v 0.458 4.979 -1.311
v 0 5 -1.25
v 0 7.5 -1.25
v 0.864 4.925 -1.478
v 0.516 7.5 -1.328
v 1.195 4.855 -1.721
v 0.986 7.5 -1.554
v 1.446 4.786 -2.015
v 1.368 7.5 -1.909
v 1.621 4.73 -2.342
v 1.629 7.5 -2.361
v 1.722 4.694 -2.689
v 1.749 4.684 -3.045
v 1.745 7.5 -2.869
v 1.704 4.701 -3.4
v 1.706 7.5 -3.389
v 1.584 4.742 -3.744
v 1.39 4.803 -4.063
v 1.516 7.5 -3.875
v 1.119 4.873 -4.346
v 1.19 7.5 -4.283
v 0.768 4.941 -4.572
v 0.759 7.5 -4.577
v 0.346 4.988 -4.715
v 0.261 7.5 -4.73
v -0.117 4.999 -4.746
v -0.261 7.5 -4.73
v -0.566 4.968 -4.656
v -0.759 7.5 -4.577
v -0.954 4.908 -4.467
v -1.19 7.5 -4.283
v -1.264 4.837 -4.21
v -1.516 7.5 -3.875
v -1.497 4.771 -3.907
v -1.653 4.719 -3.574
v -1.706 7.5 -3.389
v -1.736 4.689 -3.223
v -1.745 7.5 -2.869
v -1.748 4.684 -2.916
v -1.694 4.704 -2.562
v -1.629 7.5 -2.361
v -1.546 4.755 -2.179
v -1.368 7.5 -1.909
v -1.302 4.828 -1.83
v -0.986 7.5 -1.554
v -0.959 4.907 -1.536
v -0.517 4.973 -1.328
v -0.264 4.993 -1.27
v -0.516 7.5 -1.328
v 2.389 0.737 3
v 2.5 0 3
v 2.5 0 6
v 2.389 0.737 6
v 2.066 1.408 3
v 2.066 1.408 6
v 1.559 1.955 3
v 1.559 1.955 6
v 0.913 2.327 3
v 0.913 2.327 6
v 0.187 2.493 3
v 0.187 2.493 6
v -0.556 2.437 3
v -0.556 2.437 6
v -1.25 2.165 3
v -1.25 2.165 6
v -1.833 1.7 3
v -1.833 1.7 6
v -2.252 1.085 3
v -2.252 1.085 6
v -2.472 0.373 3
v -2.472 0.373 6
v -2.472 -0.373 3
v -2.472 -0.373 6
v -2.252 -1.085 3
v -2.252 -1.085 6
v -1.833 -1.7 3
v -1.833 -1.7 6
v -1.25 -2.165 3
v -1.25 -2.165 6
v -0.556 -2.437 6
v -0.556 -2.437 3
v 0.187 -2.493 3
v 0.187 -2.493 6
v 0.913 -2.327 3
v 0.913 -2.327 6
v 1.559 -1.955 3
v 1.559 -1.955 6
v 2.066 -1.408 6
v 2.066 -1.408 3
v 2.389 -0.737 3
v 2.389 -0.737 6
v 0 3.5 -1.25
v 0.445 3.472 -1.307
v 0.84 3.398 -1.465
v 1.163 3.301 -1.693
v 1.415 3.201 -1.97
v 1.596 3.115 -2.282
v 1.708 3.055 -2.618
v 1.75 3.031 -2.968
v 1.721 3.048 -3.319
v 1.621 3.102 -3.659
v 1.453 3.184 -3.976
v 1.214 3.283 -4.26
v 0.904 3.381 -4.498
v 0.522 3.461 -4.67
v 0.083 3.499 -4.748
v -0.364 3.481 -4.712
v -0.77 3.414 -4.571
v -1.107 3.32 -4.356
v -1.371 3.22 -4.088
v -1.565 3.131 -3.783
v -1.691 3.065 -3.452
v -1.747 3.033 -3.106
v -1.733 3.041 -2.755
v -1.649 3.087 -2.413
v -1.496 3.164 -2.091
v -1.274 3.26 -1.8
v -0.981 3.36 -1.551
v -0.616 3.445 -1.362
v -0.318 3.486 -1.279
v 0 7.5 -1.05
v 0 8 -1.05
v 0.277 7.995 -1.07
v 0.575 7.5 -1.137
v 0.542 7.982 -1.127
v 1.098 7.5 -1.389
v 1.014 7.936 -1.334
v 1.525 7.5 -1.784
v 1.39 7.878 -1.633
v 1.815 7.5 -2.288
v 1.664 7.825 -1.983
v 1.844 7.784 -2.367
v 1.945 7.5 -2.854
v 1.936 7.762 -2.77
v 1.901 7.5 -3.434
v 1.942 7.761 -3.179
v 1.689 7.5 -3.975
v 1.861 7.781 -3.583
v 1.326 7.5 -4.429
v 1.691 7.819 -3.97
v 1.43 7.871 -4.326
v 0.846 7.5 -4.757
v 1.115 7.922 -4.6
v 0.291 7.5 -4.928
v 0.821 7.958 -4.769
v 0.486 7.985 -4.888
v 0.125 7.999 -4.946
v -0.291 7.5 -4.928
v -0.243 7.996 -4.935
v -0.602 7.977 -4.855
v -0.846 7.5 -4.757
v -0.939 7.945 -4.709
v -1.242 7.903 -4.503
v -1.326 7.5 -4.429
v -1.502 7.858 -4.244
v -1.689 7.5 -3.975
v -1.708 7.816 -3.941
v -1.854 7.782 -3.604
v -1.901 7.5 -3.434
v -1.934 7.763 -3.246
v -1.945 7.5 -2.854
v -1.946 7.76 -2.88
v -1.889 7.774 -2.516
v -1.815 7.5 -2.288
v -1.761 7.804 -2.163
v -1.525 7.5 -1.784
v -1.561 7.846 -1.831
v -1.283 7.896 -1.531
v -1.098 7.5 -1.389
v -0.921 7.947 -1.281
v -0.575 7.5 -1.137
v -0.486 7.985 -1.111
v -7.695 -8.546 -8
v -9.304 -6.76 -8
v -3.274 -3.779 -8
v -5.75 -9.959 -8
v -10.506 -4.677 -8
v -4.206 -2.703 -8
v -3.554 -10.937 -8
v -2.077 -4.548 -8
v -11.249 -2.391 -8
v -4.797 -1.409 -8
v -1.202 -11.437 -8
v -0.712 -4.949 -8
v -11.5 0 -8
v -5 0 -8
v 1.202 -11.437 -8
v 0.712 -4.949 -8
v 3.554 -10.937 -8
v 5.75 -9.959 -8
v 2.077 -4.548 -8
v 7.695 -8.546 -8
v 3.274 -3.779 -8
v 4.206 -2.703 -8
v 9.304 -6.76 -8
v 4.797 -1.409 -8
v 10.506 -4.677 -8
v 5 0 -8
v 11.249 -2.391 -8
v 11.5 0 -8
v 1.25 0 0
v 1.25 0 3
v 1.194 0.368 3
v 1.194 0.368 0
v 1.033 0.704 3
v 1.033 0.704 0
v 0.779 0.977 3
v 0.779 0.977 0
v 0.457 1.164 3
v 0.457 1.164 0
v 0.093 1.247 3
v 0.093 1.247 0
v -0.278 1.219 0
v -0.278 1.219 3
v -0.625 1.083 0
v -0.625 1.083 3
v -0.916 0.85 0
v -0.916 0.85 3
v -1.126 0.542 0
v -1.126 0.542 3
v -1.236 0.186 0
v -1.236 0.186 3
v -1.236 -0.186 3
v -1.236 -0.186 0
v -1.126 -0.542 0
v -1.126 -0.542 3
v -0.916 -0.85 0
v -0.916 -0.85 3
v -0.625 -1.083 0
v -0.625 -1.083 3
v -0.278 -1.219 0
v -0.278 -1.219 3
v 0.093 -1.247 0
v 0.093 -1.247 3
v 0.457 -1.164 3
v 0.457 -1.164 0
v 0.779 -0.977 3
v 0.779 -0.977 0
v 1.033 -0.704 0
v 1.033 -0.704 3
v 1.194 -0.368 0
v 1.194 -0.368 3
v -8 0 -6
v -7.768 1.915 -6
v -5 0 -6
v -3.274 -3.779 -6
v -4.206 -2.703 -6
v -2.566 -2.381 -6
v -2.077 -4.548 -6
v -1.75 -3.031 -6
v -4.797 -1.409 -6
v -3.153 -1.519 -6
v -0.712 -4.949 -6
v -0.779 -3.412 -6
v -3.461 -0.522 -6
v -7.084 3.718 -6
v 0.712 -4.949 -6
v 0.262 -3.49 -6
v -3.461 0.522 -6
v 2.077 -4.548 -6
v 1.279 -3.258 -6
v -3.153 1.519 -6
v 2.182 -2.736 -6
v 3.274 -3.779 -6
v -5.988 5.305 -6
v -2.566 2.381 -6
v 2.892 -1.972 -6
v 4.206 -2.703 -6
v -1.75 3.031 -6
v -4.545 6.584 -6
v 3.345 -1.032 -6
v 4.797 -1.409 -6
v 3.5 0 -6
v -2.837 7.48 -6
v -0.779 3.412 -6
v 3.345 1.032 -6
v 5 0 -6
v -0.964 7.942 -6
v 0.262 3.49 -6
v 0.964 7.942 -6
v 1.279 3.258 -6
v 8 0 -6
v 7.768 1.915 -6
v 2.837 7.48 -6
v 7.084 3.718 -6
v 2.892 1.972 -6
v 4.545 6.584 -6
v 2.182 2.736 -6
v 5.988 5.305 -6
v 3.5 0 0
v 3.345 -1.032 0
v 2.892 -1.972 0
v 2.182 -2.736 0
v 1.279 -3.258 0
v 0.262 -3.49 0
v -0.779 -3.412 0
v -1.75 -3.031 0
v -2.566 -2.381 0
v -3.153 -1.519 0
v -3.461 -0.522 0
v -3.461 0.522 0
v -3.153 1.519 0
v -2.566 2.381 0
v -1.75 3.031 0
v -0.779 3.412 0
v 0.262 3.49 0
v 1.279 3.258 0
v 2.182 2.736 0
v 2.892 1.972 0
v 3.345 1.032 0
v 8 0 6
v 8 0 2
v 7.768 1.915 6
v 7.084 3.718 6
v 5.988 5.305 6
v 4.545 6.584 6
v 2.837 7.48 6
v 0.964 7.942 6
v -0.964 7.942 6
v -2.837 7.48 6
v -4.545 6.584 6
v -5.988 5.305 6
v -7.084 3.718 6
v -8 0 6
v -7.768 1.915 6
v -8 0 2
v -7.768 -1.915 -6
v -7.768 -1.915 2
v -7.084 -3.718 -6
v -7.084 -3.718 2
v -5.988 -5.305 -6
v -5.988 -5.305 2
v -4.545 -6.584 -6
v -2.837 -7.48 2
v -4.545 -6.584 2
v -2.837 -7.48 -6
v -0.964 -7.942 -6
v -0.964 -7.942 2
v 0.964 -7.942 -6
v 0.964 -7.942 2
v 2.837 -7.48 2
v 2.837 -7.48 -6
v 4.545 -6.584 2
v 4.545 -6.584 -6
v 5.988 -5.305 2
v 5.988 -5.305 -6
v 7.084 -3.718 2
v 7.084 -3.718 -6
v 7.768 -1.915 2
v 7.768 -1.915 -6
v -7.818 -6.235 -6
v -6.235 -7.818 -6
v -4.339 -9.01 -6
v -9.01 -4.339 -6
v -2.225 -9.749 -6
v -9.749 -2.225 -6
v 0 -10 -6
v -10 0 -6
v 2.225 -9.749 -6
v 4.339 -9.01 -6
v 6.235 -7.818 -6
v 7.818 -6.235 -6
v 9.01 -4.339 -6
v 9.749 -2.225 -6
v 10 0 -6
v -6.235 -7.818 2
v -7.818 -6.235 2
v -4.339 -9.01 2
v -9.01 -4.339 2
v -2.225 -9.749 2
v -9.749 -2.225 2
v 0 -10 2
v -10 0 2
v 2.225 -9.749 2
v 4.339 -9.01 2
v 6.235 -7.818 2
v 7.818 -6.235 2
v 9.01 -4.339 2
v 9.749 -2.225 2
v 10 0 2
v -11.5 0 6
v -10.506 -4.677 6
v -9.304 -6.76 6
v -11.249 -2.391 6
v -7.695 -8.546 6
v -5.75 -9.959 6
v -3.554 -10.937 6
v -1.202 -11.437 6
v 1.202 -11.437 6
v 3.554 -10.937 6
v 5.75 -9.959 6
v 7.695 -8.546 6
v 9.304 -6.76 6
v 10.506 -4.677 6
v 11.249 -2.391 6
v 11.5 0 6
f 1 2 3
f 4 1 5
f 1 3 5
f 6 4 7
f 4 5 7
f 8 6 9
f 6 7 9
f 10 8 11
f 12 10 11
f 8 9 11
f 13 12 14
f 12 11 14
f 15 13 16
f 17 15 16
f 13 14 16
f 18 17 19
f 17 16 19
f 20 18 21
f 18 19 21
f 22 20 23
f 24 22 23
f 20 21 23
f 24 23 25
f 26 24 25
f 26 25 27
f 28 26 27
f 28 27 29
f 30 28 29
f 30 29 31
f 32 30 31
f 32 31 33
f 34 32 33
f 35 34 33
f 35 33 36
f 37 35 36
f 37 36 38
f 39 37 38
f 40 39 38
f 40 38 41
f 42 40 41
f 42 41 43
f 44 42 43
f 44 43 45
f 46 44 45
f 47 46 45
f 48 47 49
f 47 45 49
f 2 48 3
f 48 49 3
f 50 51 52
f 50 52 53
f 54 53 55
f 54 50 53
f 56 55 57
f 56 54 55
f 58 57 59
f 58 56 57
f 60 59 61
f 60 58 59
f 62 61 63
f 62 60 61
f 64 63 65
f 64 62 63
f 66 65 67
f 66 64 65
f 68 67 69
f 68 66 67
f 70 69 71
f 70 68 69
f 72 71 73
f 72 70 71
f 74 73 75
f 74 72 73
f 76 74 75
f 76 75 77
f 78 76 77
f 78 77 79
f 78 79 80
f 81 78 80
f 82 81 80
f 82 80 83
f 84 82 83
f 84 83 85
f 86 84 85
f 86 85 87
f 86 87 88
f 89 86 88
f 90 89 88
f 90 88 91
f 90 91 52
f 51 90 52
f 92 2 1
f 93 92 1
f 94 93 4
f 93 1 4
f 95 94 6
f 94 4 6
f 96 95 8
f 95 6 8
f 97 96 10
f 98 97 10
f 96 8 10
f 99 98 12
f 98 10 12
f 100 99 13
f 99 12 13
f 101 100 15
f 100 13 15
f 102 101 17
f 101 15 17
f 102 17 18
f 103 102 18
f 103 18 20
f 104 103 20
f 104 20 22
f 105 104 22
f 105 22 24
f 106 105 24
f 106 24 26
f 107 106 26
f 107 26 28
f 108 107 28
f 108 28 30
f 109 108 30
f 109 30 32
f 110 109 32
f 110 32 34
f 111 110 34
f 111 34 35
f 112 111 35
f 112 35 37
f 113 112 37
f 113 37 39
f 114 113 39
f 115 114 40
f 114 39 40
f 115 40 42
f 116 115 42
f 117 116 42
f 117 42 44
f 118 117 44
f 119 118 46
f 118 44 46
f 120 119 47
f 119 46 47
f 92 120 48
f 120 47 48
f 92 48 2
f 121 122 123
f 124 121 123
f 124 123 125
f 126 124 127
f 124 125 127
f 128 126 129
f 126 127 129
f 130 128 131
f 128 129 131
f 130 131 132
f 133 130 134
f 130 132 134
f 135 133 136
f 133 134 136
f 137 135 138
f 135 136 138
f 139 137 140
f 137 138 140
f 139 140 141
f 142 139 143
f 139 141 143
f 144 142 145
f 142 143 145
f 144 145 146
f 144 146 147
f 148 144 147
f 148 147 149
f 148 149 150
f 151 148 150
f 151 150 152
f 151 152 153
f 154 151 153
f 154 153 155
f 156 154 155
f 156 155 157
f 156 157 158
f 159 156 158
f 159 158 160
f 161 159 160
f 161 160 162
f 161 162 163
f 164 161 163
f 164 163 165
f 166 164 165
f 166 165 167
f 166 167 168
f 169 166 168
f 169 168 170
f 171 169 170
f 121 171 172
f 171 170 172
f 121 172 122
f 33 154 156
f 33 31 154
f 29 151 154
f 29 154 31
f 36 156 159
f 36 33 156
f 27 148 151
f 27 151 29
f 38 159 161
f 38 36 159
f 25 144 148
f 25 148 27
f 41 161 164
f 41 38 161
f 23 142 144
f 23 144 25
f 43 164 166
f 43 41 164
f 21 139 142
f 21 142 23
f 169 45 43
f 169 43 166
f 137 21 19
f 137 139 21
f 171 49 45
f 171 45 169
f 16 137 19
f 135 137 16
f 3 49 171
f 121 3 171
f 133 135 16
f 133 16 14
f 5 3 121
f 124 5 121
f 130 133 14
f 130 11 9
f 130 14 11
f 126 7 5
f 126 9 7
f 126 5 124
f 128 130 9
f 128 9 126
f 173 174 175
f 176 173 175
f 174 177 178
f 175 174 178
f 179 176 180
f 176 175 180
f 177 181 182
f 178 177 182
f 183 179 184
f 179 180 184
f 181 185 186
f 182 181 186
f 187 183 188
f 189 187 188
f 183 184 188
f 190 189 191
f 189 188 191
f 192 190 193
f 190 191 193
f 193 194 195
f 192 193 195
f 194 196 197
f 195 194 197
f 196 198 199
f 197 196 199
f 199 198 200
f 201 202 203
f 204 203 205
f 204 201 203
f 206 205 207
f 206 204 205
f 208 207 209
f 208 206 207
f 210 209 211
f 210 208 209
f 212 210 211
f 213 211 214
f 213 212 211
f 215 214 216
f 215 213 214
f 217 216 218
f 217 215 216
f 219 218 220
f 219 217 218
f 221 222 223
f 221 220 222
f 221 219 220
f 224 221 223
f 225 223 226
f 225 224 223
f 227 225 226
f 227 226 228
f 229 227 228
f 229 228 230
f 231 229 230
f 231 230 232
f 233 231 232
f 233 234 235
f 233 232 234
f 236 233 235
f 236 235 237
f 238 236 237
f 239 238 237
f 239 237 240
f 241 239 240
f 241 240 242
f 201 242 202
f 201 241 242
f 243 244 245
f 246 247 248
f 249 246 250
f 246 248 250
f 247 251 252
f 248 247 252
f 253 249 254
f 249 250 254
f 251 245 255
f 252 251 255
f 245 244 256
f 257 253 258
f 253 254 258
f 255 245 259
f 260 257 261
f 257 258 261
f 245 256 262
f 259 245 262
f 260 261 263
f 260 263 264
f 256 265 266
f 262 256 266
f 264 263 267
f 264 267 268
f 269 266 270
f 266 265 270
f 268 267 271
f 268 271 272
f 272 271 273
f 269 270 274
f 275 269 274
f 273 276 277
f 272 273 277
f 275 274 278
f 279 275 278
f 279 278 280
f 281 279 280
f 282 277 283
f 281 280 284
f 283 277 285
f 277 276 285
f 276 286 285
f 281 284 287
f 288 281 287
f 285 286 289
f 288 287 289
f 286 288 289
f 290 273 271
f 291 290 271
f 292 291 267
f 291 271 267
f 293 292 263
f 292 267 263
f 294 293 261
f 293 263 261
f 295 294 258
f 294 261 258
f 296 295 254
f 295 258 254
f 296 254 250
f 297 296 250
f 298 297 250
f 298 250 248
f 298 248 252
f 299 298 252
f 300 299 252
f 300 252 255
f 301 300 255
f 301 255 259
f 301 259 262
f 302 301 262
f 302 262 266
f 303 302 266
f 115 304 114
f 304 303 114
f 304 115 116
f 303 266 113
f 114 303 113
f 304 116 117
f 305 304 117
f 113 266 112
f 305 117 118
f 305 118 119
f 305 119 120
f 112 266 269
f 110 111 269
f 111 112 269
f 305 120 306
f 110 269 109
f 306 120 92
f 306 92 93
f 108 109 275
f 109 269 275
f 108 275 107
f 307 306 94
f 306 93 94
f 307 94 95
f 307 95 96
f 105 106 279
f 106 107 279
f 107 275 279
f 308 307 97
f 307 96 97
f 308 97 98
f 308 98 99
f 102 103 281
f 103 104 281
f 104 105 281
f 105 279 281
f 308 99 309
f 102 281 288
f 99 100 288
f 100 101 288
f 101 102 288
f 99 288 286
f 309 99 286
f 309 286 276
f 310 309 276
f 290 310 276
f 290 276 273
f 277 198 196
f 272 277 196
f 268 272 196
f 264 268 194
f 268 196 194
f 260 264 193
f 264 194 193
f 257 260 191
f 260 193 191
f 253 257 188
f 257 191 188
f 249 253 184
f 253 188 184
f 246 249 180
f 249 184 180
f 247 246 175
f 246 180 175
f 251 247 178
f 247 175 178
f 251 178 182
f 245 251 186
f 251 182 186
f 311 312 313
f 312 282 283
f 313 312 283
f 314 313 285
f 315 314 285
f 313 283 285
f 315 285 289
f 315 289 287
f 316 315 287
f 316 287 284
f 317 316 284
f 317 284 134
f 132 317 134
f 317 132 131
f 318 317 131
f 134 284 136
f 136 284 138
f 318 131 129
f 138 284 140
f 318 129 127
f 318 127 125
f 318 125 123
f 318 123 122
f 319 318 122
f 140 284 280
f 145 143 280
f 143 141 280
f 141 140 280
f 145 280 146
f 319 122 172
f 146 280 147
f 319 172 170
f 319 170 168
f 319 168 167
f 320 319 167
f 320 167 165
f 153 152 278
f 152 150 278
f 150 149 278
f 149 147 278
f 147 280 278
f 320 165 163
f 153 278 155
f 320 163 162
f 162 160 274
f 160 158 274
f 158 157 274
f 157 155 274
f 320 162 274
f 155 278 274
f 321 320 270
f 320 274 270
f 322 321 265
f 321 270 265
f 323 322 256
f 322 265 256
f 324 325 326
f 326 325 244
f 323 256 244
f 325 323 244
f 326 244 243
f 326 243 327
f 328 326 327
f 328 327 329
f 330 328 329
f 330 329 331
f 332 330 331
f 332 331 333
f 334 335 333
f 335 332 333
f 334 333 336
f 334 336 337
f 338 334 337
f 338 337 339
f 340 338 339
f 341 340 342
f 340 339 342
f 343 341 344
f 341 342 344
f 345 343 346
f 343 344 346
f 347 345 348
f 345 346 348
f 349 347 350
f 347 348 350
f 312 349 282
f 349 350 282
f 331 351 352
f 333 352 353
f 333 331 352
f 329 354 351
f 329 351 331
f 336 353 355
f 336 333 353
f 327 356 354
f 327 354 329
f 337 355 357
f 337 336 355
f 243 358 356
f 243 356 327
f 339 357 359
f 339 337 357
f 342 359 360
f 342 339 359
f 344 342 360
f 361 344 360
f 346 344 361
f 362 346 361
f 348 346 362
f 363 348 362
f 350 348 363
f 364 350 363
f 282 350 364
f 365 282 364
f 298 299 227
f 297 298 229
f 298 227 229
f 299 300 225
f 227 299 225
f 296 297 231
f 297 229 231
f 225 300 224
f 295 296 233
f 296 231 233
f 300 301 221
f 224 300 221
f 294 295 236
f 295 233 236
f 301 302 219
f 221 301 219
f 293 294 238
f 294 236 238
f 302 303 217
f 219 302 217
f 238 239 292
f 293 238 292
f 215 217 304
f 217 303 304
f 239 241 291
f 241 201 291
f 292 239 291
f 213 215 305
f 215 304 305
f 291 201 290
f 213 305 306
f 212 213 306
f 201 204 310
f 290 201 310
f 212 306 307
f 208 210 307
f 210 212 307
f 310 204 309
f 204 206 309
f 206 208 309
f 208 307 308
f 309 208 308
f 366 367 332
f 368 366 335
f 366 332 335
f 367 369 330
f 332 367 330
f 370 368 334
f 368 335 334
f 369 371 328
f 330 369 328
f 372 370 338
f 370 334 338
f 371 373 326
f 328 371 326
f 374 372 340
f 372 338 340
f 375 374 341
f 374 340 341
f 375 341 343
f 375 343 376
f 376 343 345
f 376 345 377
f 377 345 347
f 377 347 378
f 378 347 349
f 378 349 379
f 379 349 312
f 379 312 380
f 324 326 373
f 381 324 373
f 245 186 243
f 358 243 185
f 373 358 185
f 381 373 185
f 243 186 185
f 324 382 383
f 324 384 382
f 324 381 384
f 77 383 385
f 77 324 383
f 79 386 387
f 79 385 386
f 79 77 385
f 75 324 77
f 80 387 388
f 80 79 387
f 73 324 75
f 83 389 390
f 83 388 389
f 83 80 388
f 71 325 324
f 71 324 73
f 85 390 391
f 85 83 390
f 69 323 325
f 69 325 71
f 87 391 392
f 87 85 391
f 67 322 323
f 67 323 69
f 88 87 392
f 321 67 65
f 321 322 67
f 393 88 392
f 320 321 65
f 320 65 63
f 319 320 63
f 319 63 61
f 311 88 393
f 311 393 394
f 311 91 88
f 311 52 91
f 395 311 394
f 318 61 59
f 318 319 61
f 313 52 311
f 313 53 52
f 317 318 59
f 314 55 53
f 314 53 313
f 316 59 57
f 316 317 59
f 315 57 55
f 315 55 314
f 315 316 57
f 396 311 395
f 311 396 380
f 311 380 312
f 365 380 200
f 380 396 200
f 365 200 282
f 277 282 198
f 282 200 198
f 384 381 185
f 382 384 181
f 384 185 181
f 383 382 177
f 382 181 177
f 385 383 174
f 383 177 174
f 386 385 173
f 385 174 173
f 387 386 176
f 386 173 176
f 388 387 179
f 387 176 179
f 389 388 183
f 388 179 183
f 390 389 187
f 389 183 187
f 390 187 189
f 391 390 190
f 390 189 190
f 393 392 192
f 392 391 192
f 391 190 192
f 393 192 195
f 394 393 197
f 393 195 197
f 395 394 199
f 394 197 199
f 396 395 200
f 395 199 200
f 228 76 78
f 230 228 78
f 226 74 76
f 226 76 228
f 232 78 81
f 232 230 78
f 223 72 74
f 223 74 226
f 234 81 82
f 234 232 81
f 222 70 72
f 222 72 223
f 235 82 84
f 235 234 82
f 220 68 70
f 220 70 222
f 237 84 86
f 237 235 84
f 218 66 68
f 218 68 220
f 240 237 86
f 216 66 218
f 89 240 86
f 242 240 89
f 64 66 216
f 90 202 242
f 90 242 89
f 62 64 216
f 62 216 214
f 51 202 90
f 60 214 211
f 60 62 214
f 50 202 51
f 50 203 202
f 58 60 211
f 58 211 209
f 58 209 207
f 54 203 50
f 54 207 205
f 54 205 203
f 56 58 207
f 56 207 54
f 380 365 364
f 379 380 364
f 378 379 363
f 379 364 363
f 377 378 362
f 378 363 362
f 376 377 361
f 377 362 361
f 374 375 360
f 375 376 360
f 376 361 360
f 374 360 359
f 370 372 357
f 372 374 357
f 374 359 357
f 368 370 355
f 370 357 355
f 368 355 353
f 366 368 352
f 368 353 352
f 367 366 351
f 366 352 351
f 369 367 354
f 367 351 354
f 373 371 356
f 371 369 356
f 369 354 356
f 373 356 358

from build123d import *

# Parameters (mm, degrees)
SKETCH_1_R           = 5
SKETCH_1_R_2         = 2.5
EXTRUDE_1_DEPTH      = 6
SKETCH_2_R           = 2.5
EXTRUDE_2_DEPTH      = 3
SKETCH_3_R           = 1.25
CUT_EXTRUDE_3_DEPTH  = 10.273618495
EXTRUDE_START        = -12
SKETCH_8_R           = 8
SKETCH_8_R_2         = 5
EXTRUDE_4_DEPTH      = 12
SKETCH_11_R          = 1.75
CUT_EXTRUDE_4_DEPTH  = 12
SKETCH_12_R          = 1.95
CUT_EXTRUDE_5_DEPTH  = 0.5
EXTRUDE_START_2      = -10
EXTRUDE_5_DEPTH      = 10
FILLET_1_R           = 1
CUT_EXTRUDE_7_DEPTH  = 6
CUT_EXTRUDE_8_DEPTH  = 10
FILLET_2_R           = 10
EXTRUDE_START_3      = 2
EXTRUDE_6_DEPTH      = 2
EXTRUDE_7_DEPTH      = 2
CUT_EXTRUDE_9_DEPTH  = 27.588216719
EXTRUDE_START_4      = 6
SKETCH_20_R          = 5
SKETCH_20_R_2        = 3.5
EXTRUDE_8_DEPTH      = 6
SKETCH_21_R          = 1.75
CUT_EXTRUDE_10_DEPTH = 10


with BuildPart() as part:
    # 草图1 → 凸台-拉伸1 (new body)
    with BuildSketch(Plane.XY):
        Circle(SKETCH_1_R)
        Circle(SKETCH_1_R_2, mode=Mode.SUBTRACT)
    extrude(amount=EXTRUDE_1_DEPTH)

    # 草图2 → 凸台-拉伸2 (add)
    with BuildSketch(Plane.XY):
        Circle(SKETCH_2_R)
    extrude(amount=EXTRUDE_2_DEPTH)

    # 草图3 → 切除-拉伸3 (cut, through all)
    with BuildSketch(Plane.XY):
        Circle(SKETCH_3_R)
    extrude(amount=CUT_EXTRUDE_3_DEPTH, mode=Mode.SUBTRACT)

    # 草图8 → 凸台-拉伸4 (add)
    with BuildSketch(Plane.XY.offset(6).offset(EXTRUDE_START)):
        Circle(SKETCH_8_R)
        Circle(SKETCH_8_R_2, mode=Mode.SUBTRACT)
    extrude(amount=EXTRUDE_4_DEPTH)

    # 草图11 → 切除-拉伸4 (cut)
    with BuildSketch(Plane(origin=(0, 8, 0), x_dir=(1, 0, 0), z_dir=(0, 1, 0))):
        with Locations(Location((0, 3, 0), (0, 0, 270))):
            Circle(SKETCH_11_R)
    extrude(amount=-CUT_EXTRUDE_4_DEPTH, mode=Mode.SUBTRACT)

    # 草图12 → 切除-拉伸5 (cut)
    with BuildSketch(Plane(origin=(0, 8, 0), x_dir=(1, 0, 0), z_dir=(0, 1, 0))):
        with Locations(Location((0, 3, 0), (0, 0, 270))):
            Circle(SKETCH_12_R)
    extrude(amount=-CUT_EXTRUDE_5_DEPTH, mode=Mode.SUBTRACT)

    # 草图13 → 凸台-拉伸5 (add)
    with BuildSketch(Plane.XY.offset(6).offset(EXTRUDE_START_2)):
        with BuildLine():
            Line((-8, 0), (-16, 0))
            ThreePointArc((-16, 0), (0, -16), (16, 0))
            Line((16, 0), (8, 0))
            ThreePointArc((8, 0), (0, -8), (-8, 0))
        make_face()
    extrude(amount=EXTRUDE_5_DEPTH)

    # 圆角1
    fillet_1_edges = [part.edges().sort_by_distance(p)[0] for p in [
        (16, 0, 1),
        (-16, 0, 1),
    ]]
    fillet(fillet_1_edges, radius=FILLET_1_R)

    # 草图15 → 切除-拉伸7 (cut)
    with BuildSketch(Plane(origin=(0, 0, -4), x_dir=(-1, 0, 0), z_dir=(0, 0, -1))):
        with BuildLine():
            Line((-10, 0), (-8, 0))
            ThreePointArc((-8, 0), (0, -8), (8, 0))
            Line((8, 0), (10, 0))
            ThreePointArc((10, 0), (0, -10), (-10, 0))
        make_face()
    extrude(amount=-CUT_EXTRUDE_7_DEPTH, mode=Mode.SUBTRACT)

    # 草图16 → 切除-拉伸8 (cut)
    with BuildSketch(Plane(origin=(0, 0, -4), x_dir=(-1, 0, 0), z_dir=(0, 0, -1))):
        with BuildLine():
            Line((11.661330827, 0), (14.966629547, 0))
            ThreePointArc((14.966629547, 0), (15.69692629, -0.316869949), (15.96440485, -1.066666667))
            ThreePointArc((15.96440485, -1.066666667), (13.334766709, -8.842171499), (7.195716327, -14.290614631))
            ThreePointArc((7.195716327, -14.290614631), (10.518928308, -7.486043338), (11.661330827, 0))
        make_face()
    extrude(amount=-CUT_EXTRUDE_8_DEPTH, mode=Mode.SUBTRACT)

    # 圆角2
    fillet_2_edges = [part.edges().sort_by_distance(p)[0] for p in [
        (-7.195716327, -14.290614631, 1),
    ]]
    fillet(fillet_2_edges, radius=FILLET_2_R)

    # 草图17 → 凸台-拉伸6 (add)
    with BuildSketch(Plane(origin=(0, 0, -4), x_dir=(-1, 0, 0), z_dir=(0, 0, -1)).offset(EXTRUDE_START_3)):
        with BuildLine():
            Line((10, 0), (11.661330827, 0))
            ThreePointArc((11.661330827, 0), (11.141957729, -5.079523953), (9.605333334, -9.948825493))
            ThreePointArc((9.605333334, -9.948825493), (6.210515001, -14.141064577), (1.131984253, -15.95990638))
            ThreePointArc((1.131984253, -15.95990638), (-10.509629988, -12.064314217), (-15.96440485, -1.066666667))
            ThreePointArc((-15.96440485, -1.066666667), (-15.69692629, -0.316869949), (-14.966629547, 0))
            Line((-14.966629547, 0), (-10, 0))
            ThreePointArc((-10, 0), (0, -10), (10, 0))
        make_face()
    extrude(amount=-EXTRUDE_6_DEPTH)

    # 草图18 → 凸台-拉伸7 (add)
    with BuildSketch(Plane(origin=(0, 0, -6), x_dir=(-1, 0, 0), z_dir=(0, 0, -1)).offset(EXTRUDE_START_3)):
        with BuildLine():
            Line((10, 0), (11.661330827, 0))
            ThreePointArc((11.661330827, 0), (11.141957729, -5.079523953), (9.605333334, -9.948825493))
            ThreePointArc((9.605333334, -9.948825493), (6.210515001, -14.141064577), (1.131984253, -15.95990638))
            ThreePointArc((1.131984253, -15.95990638), (-10.509629988, -12.064314217), (-15.96440485, -1.066666667))
            ThreePointArc((-15.96440485, -1.066666667), (-15.69692629, -0.316869949), (-14.966629547, 0))
            Line((-14.966629547, 0), (-10, 0))
            Line((-10, 0), (-8, 0))
            Line((-8, 0), (-5, 0))
            ThreePointArc((-5, 0), (0, -5), (5, 0))
            Line((5, 0), (8, 0))
            Line((8, 0), (10, 0))
        make_face()
    extrude(amount=-EXTRUDE_7_DEPTH)

    # 草图19 → 切除-拉伸9 (cut, through all)
    with BuildSketch(Plane(origin=(0, 0, -8), x_dir=(-1, 0, 0), z_dir=(0, 0, -1))):
        with BuildLine():
            Line((11.661330827, 0), (11.5, 0))
            ThreePointArc((11.5, 0), (0, -11.5), (-11.5, 0))
            Line((-11.5, 0), (-14.966629547, 0))
            ThreePointArc((-14.966629547, 0), (-15.69692629, -0.316869949), (-15.96440485, -1.066666667))
            ThreePointArc((-15.96440485, -1.066666667), (-10.509629988, -12.064314217), (1.131984253, -15.95990638))
            ThreePointArc((1.131984253, -15.95990638), (6.210515001, -14.141064577), (9.605333334, -9.948825493))
            ThreePointArc((9.605333334, -9.948825493), (11.141957729, -5.079523953), (11.661330827, 0))
        make_face()
    extrude(amount=-CUT_EXTRUDE_9_DEPTH, mode=Mode.SUBTRACT)

    # 草图20 → 凸台-拉伸8 (add)
    with BuildSketch(Plane(origin=(0, 0, 0), x_dir=(-1, 0, 0), z_dir=(0, 0, -1)).offset(EXTRUDE_START_4)):
        Circle(SKETCH_20_R)
        with Locations(Location((0, 0, 0), (0, 0, 180))):
            Circle(SKETCH_20_R_2, mode=Mode.SUBTRACT)
    extrude(amount=-EXTRUDE_8_DEPTH)

    # 草图21 → 切除-拉伸10 (cut)
    with BuildSketch(Plane(origin=(0, 8, 0), x_dir=(1, 0, 0), z_dir=(0, 1, 0))):
        with Locations(Location((0, 3, 0), (0, 0, 270))):
            Circle(SKETCH_21_R)
    extrude(amount=-CUT_EXTRUDE_10_DEPTH, mode=Mode.SUBTRACT)


solid = part.part
